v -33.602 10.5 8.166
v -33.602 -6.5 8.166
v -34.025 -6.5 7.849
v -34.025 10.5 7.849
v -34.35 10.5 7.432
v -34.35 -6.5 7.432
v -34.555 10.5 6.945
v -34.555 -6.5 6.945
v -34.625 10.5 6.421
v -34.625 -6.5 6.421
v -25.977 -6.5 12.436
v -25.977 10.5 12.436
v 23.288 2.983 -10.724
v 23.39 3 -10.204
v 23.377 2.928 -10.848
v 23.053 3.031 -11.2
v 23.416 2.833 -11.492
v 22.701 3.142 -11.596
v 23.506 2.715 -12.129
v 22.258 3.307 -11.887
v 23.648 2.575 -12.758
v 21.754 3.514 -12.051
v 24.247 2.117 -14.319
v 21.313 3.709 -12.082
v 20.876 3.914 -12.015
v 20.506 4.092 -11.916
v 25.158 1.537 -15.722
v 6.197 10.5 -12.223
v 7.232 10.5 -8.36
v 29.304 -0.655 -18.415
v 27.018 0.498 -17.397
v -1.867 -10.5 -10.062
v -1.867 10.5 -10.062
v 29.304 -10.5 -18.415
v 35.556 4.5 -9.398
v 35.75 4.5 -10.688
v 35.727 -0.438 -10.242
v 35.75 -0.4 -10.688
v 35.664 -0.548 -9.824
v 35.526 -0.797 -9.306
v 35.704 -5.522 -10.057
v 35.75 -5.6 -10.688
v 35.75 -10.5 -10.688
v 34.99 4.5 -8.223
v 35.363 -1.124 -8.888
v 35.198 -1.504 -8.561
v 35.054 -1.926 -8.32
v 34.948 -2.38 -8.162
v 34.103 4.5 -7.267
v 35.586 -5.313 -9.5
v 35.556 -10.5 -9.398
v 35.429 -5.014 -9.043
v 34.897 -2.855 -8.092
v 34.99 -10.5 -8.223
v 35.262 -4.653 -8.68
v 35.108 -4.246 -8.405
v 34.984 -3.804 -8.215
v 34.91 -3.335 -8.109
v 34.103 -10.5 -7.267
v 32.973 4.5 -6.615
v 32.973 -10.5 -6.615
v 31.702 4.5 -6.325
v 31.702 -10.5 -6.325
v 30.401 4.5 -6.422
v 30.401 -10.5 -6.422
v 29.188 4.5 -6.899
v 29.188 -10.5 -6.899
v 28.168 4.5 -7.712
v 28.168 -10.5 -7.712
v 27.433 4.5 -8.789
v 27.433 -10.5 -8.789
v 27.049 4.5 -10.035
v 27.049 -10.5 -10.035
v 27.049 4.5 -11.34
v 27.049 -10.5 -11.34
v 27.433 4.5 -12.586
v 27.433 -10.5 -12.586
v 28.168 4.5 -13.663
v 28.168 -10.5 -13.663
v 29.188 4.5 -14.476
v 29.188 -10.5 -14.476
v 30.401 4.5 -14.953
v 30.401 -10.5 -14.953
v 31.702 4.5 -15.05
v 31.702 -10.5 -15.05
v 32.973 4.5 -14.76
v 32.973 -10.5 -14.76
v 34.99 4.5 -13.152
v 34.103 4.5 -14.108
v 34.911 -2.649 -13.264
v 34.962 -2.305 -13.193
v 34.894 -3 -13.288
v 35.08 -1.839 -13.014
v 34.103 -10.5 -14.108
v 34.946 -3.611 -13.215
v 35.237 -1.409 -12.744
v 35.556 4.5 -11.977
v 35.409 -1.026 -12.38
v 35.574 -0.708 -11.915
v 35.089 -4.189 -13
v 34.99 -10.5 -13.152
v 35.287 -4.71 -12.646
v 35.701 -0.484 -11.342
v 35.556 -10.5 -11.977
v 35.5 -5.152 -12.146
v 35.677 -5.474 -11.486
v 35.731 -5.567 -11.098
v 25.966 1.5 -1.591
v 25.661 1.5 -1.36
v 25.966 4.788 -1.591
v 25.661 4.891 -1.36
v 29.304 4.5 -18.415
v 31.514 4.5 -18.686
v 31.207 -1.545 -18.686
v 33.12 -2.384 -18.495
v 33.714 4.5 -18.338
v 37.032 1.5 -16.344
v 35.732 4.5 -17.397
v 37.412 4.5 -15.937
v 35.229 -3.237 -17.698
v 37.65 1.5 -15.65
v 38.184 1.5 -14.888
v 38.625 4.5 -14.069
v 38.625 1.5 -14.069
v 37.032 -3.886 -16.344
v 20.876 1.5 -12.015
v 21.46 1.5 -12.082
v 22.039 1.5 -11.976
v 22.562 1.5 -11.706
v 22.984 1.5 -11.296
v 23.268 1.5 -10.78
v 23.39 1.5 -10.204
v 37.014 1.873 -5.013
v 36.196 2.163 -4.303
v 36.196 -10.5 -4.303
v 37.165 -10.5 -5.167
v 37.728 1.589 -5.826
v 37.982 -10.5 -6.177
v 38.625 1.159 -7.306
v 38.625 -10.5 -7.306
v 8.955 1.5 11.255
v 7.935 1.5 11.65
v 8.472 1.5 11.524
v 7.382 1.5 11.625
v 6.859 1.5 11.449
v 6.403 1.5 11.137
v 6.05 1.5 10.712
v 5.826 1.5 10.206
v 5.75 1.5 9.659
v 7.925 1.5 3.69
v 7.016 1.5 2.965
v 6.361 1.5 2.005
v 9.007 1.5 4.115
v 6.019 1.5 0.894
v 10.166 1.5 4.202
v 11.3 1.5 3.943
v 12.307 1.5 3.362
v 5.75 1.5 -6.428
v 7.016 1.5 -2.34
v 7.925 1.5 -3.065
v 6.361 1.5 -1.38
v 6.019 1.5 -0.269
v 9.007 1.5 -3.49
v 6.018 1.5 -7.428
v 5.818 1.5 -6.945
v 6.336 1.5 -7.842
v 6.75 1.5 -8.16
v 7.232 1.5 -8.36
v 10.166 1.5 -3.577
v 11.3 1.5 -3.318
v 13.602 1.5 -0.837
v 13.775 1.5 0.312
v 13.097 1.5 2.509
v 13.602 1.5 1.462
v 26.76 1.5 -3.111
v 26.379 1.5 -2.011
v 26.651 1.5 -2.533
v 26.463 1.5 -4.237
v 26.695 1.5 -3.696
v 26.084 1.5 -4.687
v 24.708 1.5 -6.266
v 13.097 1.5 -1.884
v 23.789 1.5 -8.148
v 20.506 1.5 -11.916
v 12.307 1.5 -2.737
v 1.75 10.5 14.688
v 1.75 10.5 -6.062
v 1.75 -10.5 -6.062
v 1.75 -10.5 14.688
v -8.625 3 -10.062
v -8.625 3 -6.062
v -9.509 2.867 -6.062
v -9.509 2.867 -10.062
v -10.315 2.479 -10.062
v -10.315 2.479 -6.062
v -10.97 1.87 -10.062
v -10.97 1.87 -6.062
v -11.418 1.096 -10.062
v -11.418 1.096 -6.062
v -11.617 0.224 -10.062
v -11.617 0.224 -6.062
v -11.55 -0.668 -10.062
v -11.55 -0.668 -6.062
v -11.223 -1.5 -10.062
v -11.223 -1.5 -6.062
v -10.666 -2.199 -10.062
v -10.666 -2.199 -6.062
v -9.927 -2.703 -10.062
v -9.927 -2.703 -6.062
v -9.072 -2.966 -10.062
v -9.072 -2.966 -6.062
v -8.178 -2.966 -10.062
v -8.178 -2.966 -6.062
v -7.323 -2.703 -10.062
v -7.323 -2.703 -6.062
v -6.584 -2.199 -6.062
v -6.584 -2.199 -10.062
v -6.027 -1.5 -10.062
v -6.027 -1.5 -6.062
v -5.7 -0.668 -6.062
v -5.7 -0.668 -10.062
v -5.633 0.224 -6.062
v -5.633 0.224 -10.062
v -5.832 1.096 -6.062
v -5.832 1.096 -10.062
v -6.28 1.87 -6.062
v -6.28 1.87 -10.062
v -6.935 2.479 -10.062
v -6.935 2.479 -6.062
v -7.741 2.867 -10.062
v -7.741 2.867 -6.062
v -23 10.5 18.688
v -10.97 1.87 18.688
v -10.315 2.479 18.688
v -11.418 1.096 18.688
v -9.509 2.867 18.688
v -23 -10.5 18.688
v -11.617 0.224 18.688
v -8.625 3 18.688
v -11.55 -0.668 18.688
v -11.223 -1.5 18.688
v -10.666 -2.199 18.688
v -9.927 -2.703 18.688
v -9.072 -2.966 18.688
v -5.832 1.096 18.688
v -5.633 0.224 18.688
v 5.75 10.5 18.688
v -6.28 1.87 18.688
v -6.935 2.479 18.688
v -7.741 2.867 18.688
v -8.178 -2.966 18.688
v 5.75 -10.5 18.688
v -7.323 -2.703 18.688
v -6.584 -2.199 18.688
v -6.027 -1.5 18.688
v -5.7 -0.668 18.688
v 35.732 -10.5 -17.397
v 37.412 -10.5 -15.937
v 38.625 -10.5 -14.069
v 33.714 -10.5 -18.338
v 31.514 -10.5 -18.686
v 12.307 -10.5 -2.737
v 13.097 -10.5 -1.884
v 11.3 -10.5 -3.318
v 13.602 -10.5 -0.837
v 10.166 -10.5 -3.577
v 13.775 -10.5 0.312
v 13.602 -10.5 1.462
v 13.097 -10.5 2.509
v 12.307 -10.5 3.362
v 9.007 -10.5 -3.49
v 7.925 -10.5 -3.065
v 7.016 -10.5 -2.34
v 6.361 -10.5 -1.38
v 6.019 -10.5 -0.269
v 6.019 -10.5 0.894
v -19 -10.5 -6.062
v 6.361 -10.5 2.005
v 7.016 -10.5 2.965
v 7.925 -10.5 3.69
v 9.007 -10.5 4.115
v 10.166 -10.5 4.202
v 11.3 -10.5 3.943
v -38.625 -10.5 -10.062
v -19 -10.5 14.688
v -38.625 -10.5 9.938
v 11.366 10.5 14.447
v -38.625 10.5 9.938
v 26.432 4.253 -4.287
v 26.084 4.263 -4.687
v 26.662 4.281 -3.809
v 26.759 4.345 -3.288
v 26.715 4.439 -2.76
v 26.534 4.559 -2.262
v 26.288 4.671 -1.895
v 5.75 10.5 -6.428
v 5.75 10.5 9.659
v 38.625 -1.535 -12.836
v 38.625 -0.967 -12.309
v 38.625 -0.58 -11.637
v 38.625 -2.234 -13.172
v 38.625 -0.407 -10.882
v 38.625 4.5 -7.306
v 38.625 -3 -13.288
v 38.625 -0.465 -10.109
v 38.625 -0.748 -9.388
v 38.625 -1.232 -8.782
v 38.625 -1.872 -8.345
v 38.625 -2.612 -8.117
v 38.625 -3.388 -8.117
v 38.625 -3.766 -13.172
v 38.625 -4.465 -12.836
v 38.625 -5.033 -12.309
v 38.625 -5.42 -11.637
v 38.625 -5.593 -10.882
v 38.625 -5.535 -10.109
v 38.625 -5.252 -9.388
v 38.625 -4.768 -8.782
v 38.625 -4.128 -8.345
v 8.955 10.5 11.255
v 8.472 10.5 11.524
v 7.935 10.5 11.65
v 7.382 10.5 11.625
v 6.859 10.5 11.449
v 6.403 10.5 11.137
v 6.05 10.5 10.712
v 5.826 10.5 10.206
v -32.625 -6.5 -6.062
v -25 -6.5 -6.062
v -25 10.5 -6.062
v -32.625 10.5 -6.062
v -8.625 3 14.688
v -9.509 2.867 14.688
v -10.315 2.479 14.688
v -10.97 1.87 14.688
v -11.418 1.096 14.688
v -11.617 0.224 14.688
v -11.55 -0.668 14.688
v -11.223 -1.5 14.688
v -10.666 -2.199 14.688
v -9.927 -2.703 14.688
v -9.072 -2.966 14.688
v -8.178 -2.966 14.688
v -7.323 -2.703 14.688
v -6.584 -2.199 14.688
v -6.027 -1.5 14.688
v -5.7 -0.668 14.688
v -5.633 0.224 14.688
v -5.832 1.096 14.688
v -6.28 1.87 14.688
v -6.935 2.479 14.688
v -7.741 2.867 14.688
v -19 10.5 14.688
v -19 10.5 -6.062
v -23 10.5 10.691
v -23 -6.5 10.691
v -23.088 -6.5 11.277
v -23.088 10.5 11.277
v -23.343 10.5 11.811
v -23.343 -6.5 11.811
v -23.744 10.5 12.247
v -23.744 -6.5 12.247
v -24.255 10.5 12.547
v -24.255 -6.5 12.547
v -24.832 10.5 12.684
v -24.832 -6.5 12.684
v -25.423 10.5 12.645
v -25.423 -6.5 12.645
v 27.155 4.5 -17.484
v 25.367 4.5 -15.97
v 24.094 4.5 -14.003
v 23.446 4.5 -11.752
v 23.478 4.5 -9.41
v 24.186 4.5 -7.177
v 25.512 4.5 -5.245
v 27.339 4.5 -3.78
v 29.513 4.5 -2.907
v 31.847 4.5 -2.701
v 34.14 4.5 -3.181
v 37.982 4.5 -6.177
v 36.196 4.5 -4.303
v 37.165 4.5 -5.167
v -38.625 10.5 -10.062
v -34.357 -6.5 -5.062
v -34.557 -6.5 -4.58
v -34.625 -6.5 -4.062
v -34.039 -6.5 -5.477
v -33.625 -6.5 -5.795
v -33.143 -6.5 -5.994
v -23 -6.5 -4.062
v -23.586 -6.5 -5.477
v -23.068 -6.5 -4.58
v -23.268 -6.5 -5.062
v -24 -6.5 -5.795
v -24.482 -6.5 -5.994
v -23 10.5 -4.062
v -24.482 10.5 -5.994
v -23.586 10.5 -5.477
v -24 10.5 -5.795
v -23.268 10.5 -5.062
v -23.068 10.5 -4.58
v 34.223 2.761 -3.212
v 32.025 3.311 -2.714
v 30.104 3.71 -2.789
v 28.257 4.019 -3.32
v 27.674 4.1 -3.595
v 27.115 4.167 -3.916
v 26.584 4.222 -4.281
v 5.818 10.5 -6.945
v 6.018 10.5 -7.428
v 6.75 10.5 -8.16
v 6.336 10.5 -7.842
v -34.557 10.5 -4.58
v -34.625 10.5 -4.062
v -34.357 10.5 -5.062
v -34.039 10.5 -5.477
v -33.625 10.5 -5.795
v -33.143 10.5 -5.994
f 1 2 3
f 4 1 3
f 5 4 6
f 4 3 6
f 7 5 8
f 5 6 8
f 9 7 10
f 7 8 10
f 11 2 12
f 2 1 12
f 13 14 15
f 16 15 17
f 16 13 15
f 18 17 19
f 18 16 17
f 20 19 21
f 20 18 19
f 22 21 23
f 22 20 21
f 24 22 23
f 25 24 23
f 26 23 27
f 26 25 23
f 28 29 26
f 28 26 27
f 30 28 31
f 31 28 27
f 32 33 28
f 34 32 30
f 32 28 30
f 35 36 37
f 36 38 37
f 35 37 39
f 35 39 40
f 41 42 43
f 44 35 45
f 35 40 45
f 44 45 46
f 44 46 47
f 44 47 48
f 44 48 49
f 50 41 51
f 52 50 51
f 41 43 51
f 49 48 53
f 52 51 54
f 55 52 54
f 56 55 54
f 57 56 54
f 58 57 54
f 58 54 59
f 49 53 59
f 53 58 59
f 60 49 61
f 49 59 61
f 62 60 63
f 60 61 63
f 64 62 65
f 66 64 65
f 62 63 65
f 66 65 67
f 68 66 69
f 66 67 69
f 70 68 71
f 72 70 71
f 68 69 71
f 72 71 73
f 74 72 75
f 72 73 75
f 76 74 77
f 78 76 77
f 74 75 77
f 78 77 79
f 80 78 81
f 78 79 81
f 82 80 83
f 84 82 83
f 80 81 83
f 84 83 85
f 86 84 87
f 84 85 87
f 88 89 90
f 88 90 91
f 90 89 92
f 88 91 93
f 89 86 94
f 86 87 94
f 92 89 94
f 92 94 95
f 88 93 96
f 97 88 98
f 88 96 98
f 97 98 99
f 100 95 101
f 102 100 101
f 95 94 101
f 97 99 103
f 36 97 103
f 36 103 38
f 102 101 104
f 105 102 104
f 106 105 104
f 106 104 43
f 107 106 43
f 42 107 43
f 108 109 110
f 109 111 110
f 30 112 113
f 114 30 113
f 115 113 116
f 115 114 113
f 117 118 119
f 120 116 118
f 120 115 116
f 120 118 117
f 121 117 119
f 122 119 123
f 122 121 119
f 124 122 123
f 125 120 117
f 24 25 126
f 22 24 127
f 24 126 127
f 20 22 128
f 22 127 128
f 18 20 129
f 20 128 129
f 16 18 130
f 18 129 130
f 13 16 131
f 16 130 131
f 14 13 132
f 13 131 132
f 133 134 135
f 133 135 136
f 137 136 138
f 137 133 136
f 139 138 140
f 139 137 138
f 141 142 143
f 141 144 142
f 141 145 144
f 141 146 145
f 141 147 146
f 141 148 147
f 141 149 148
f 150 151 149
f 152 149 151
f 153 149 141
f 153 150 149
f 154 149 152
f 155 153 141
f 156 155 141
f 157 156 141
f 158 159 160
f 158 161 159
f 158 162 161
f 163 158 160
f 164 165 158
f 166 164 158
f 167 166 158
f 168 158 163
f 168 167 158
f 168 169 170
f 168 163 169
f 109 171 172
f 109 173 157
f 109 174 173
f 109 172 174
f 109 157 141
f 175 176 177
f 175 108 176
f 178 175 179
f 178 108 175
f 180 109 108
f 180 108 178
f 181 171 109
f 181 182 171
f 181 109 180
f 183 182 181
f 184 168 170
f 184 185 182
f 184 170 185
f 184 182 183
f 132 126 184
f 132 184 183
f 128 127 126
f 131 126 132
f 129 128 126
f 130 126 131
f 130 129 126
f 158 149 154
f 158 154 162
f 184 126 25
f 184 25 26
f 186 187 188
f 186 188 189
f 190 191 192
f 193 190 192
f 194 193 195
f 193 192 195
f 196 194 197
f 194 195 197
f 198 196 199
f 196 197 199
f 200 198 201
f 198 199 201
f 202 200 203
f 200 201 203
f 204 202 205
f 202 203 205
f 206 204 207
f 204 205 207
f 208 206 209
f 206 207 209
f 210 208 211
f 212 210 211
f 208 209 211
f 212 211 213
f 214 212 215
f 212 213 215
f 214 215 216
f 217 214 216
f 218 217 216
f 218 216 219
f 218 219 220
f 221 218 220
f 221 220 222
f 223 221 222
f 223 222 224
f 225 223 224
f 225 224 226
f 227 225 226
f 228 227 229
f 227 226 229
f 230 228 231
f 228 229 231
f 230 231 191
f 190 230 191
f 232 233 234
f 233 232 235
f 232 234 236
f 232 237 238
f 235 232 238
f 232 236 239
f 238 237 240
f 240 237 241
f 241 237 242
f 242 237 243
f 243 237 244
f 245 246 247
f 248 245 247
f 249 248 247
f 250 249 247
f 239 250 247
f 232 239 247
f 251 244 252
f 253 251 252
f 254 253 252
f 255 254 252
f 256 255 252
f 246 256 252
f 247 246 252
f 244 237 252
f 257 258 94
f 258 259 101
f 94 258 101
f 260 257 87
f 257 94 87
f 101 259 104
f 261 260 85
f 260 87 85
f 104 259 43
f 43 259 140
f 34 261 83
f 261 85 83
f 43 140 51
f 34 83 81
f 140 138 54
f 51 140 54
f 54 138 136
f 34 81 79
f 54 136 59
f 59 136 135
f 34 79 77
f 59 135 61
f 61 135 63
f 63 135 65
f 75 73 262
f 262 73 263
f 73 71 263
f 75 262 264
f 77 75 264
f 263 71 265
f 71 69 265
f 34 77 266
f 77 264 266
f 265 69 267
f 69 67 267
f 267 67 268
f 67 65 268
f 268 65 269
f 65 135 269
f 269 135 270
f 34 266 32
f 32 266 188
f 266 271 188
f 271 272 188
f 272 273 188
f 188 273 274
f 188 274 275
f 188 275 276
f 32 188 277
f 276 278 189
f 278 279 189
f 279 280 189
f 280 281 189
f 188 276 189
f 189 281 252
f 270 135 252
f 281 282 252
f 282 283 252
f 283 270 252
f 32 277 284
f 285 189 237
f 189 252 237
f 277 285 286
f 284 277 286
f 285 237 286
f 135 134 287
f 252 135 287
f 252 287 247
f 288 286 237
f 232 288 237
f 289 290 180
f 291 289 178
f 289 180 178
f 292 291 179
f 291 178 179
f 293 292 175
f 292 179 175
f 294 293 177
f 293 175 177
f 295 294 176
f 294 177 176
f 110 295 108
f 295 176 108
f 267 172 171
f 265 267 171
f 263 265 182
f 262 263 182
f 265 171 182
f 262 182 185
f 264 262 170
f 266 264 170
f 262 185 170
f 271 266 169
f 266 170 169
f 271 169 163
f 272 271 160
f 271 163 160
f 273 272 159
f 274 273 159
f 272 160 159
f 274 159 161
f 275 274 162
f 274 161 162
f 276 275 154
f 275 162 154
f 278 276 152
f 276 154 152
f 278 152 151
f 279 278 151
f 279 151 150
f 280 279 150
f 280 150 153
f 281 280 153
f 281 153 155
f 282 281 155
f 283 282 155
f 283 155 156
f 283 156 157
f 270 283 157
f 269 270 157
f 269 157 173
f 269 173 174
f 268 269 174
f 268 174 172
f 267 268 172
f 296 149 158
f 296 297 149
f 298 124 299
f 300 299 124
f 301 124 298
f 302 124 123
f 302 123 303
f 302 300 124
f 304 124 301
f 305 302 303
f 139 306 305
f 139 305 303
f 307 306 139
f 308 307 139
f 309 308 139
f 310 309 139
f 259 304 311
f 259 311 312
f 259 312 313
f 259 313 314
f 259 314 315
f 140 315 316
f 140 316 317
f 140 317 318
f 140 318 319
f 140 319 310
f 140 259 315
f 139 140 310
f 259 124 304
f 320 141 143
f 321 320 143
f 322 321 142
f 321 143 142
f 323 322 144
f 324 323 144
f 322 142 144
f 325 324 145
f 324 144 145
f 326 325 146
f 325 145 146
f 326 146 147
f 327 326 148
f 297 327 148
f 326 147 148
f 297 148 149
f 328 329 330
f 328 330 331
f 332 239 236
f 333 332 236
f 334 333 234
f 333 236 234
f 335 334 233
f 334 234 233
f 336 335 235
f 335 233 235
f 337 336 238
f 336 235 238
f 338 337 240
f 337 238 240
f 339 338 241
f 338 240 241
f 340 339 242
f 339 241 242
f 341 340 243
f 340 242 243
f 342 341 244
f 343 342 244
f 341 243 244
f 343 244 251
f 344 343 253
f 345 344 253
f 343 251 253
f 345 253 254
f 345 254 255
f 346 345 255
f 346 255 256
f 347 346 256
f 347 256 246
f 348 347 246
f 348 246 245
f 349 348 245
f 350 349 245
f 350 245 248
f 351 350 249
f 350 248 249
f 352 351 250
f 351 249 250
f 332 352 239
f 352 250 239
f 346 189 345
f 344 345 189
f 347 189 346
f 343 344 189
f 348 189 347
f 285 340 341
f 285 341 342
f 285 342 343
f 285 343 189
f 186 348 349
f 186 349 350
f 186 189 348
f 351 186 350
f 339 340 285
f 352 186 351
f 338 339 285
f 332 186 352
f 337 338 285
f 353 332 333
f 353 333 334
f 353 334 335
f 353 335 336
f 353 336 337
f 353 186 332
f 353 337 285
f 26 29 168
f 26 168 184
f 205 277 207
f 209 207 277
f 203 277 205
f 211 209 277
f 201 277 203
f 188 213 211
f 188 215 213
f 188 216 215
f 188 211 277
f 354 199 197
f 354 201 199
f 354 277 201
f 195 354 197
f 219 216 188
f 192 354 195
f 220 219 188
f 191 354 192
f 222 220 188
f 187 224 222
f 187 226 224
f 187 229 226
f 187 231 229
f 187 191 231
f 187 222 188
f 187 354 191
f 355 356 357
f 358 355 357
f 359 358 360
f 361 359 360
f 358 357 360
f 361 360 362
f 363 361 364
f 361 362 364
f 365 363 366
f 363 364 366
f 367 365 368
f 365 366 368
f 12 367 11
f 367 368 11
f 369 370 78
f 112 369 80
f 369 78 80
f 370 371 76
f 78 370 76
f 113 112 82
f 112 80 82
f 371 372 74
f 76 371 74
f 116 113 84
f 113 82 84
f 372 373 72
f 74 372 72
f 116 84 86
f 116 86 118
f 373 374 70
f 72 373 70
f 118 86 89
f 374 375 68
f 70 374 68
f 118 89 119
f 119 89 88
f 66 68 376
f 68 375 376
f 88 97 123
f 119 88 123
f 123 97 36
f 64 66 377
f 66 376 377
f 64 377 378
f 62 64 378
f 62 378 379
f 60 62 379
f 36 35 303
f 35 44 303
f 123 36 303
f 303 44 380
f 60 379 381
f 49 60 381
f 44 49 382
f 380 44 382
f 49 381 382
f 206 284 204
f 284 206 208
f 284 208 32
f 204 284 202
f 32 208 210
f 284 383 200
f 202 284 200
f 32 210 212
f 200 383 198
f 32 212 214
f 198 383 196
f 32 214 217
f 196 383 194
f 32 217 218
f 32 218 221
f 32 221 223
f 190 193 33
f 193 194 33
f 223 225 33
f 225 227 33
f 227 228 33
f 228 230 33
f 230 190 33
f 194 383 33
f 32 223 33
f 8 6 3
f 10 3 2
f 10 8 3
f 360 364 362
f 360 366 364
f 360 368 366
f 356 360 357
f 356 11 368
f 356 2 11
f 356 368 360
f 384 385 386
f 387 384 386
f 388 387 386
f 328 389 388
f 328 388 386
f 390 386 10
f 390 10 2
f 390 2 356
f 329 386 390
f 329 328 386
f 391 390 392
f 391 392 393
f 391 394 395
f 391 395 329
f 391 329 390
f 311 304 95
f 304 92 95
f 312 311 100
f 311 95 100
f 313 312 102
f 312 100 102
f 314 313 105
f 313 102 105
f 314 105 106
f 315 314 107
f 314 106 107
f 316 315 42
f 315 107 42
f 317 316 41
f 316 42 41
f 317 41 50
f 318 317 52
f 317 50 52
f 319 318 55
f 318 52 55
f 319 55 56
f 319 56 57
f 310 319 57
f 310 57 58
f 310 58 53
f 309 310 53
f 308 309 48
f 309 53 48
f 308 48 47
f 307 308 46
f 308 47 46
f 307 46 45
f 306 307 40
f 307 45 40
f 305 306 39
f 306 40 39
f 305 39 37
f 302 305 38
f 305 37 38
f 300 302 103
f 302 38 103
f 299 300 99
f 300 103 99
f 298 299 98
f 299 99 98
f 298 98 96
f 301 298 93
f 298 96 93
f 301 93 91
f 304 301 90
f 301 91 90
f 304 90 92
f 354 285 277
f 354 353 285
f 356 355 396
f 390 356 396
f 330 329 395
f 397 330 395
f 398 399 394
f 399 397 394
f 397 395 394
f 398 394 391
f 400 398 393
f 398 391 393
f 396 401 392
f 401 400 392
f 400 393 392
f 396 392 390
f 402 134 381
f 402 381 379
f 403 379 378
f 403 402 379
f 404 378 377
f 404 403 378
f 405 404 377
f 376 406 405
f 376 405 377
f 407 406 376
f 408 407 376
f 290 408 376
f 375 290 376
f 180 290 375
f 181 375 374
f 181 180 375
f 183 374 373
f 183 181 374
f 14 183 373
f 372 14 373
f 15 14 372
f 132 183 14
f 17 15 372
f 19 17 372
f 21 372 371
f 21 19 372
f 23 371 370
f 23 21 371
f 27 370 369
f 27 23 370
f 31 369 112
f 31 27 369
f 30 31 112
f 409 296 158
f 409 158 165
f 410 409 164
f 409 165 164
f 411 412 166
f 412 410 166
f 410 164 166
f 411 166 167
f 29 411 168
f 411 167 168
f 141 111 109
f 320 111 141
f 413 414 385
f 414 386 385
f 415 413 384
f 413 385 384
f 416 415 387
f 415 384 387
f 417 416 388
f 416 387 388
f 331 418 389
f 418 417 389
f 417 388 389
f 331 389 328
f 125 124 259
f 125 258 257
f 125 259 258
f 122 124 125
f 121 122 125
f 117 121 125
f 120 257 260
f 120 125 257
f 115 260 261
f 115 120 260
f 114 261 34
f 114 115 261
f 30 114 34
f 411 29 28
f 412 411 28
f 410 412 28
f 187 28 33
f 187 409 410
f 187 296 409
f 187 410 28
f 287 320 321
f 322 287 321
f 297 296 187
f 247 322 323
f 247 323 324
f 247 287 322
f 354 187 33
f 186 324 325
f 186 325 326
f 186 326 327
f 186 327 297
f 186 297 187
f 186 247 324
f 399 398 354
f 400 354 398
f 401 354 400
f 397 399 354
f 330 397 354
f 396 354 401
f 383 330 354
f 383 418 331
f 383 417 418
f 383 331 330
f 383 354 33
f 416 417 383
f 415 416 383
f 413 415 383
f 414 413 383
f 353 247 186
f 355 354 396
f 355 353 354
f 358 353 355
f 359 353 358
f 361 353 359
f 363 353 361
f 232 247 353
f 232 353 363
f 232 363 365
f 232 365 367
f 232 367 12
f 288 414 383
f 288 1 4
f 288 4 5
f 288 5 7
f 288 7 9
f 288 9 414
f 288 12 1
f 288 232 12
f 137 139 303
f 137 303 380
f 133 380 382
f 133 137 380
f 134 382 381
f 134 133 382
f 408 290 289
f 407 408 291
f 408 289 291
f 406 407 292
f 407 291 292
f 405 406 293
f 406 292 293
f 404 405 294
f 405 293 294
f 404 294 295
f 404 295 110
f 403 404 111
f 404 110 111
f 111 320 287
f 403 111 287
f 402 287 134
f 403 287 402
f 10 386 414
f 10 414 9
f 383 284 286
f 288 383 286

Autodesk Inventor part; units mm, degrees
ref_plane "YZ Plane" through (0, 0, 0) normal (1, 0, 0) x (0, 1, 0)
sketch "Sketch1" plane through (0, 0, 0) normal (0, 1, 0) x (-1, 0, 0)
  line L0 (38.625, 18.6875) -> (-38.625, 18.6875)
  line L1 (-38.625, 18.6875) -> (-38.625, -18.6875)
  line L2 (-38.625, -18.6875) -> (38.625, -18.6875)
  line L3 (38.625, -18.6875) -> (38.625, 18.6875)
  line L4 (38.625, 18.6875) -> (-38.625, -18.6875) construction
  line L5 (-38.625, 18.6875) -> (38.625, -18.6875) construction
  point P0 (0, 0)
  dimension "d0" = 77.25
  dimension "d2" = 37.375
extrude "Extrusion1" add sketch "Sketch1" along normal mid plane 21
sketch "Sketch2" plane through (0, 10.5, 0) normal (0, 1, 0) x (1, 0, 0)
  line L0 (-19, 6.0625) -> (1.75, 6.0625)
  line L1 (1.75, 6.0625) -> (1.75, -14.6875)
  line L2 (1.75, -14.6875) -> (-19, -14.6875)
  line L3 (-19, -14.6875) -> (-19, 6.0625)
  line L4 (-19, 6.0625) -> (1.75, -14.6875) construction
  line L5 (1.75, 6.0625) -> (-19, -14.6875) construction
  line L6 (-38.625, -18.6875) -> (38.625, -18.6875) projected
  line L7 (-38.625, 18.6875) -> (-38.625, -18.6875) projected
  line L8 (-38.625, 10.0625) -> (-1.8672, 10.0625)
  line L9 (-1.8672, 10.0625) -> (29.3044, 18.4149)
  arc A0 (36.196, 4.3033) -> (29.3044, 18.4149) centre (31.375, 10.6875) ccw
  line L10 (38.625, 18.6875) -> (-38.625, 18.6875) projected
  line L11 (36.196, 4.3033) -> (5.75, -18.6875)
  line L12 (-38.625, -9.9375) -> (-23, -18.6875)
  arc A1 (29.3044, 18.4149) -> (36.196, 4.3033) centre (31.375, 10.6875) ccw construction
  circle A2 centre (9.875, -0.3125) radius 3.9
  circle A3 centre (31.375, 10.6875) radius 4.375
  point P0 (0, 0)
  point P1 (-8.625, -4.3125)
  dimension "d5" = 20.75
  dimension "d6" = 20.75
  dimension "d7" = 4
  dimension "d8" = 19.625
  dimension "d9" = 28.75
  dimension "d10" = 16
  dimension "d11" = 70
  dimension "d12" = 44.375
  dimension "d13" = 165
  dimension "d14" = 15.625
  dimension "d15" = 8.75
  dimension "d18" = 7.8
  dimension "d19" = 18.375
  dimension "d20" = 48.5
  dimension "d21" = 8.75
extrude "Extrusion2" cut sketch "Sketch2" against normal blind 23.75 contours L12 L7 L8 L9 A0 L11 L6 keep common part
sketch "Sketch3" plane through (0, 10.5, 0) normal (0, 1, 0) x (1, 0, 0)
  line L0 (-23, 6.0625) -> (-34.625, 6.0625)
  line L1 (-34.625, 6.0625) -> (-34.625, -7.593)
  line L2 (-34.625, -7.593) -> (-23, -14.103)
  line L3 (-23, -14.103) -> (-23, 6.0625)
  line L4 (-19, 6.0625) -> (-19, -14.6875) projected
  line L5 (-38.625, 10.0625) -> (-1.8672, 10.0625) projected
  line L6 (-38.625, 10.0625) -> (-38.625, -9.9375) projected
  line L7 (-23, -18.6875) -> (-38.625, -9.9375) projected
  point P0 (0, 0)
  dimension "d22" = 4
  dimension "d23" = 4
  dimension "d24" = 4
  dimension "d25" = 4
extrude "Extrusion3" cut sketch "Sketch3" against normal blind 17
sketch "Sketch4" plane through (0, 10.5, 0) normal (0, 1, 0) x (1, 0, 0)
  line L0 (5.75, -13.6752) -> (5.75, 7.9624)
  line L1 (5.75, 7.9624) -> (23.2324, 12.6468)
  arc A0 (23.2324, 12.6468) -> (27.9136, 3.0613) centre (31.375, 10.6875) ccw
  line L2 (27.9136, 3.0613) -> (5.75, -13.6752)
  circle A1 centre (31.375, 10.6875) radius 4.375 projected
  line L3 (-1.8672, 10.0625) -> (29.3044, 18.4149) projected
  line L4 (36.196, 4.3033) -> (5.75, -18.6875) projected
  line L5 (1.75, -14.6875) -> (1.75, 6.0625) projected
  point P0 (0, 0)
  dimension "d28" = 4
  dimension "d29" = 4
  dimension "d30" = 4
  dimension "d31" = 4
extrude "Extrusion4" cut sketch "Sketch4" against normal blind 9 contours L0 L1 A0 L2
fillet "Fillet1" radius 2 8 edges at (-34.625, 2, -6.0625) (-23, 2, -6.0625) (-34.625, 2, 7.593) (-23, 2, 14.103) (5.75, 6, 13.6752) (27.9136, 6, -3.0613) (5.75, 6, -7.9624) (23.2324, 6, -12.6468)
ref_plane "Work Plane1" through (7.2324, 10.5, -8.3596) normal (-0.8754261, 0.4226183, 0.2345697) x (0.258819, 0, 0.9659258)
sketch "Sketch5" plane through (7.2324, 10.5, -8.3596) normal (-0.8754261, 0.4226183, 0.2345697) x (0.258819, 0, 0.9659258)
  line L0 (-4, -3.5283) -> (-4, 10.1101) projected
  line L1 (0, 0) -> (0, 5.8077) projected
  line L2 (0, 0) -> (-4, 0)
  line L3 (-4, 0) -> (-4, 17.443)
  line L4 (-4, 17.443) -> (0, 17.443)
  line L5 (0, 17.443) -> (0, 0)
  point P0 (6.2029, -13.383)
extrude "Extrusion5" cut sketch "Sketch5" against normal blind 98.5
ref_plane "Work Plane2" through (8.9552, 10.5, 11.2548) normal (-0.770837, 0.258819, 0.5820851) x (-0.6026188, 0, -0.7980292)
sketch "Sketch6" plane through (8.9552, 10.5, 11.2548) normal (-0.770837, 0.258819, 0.5820851) x (-0.6026188, 0, -0.7980292)
  line L0 (-4, -8.053) -> (-4, 1.8213) projected
  line L1 (0, -5.4181) -> (0, 0) projected
  line L2 (0, 0) -> (-4, 0)
  line L3 (-4, 0) -> (-4, -11.4491)
  line L4 (-4, -11.4491) -> (0, -11.4491)
  line L5 (0, -11.4491) -> (0, 0)
  point P0 (14.3782, 10.2365)
extrude "Extrusion6" cut sketch "Sketch6" against normal blind 98.5
sketch "Sketch7" plane through (0, 10.5, 0) normal (0, 1, 0) x (1, 0, 0)
  line L0 (25.6612, 1.3605) -> (32.3712, 6.4274) projected
  arc A0 (28.6279, 14.0925) -> (32.3712, 6.4274) centre (31.375, 10.6875) ccw projected
  line L1 (28.6279, 14.0925) -> (20.5062, 11.9163) projected
  arc A1 (23.0192, 10.12) -> (20.5062, 11.9163) centre (21.0238, 9.9845) ccw projected
  arc A2 (23.0192, 10.12) -> (25.7898, 4.4468) centre (31.375, 10.6875) ccw projected
  arc A3 (25.6612, 1.3605) -> (25.7898, 4.4468) centre (24.456, 2.9565) ccw projected
  line L2 (35.1997, 8.5633) -> (38.625, 11.1499) projected
  line L3 (38.625, 11.1499) -> (38.625, 14.0694) projected
  arc A4 (38.625, 14.0694) -> (37.0319, 16.3444) centre (31.375, 10.6875) ccw projected
  line L4 (37.0319, 16.3444) -> (32.0515, 15.0099) projected
  arc A5 (35.1997, 8.5633) -> (32.0515, 15.0099) centre (31.375, 10.6875) ccw projected
  point P0 (0, 0)
extrude "Extrusion7" cut sketch "Sketch7" against normal up to surface (9 mm away)
sketch "Sketch8" plane through (0, -10.5, 0) normal (0, -1, 0) x (1, 0, 0)
  arc A0 (29.3044, -18.4149) -> (38.625, -14.0694) centre (31.375, -10.6875) ccw projected
  circle A1 centre (31.375, -10.6875) radius 4.375 projected
  arc A2 (38.625, -7.3056) -> (36.196, -4.3033) centre (31.375, -10.6875) ccw projected
  line L0 (38.625, -14.0694) -> (38.625, -7.3056) projected
  line L1 (36.196, -4.3033) -> (11.3657, 14.4469) projected
  arc A3 (36.196, -4.3033) -> (29.3044, -18.4149) centre (31.375, -10.6875) ccw
  point P0 (0, 0)
extrude "Extrusion8" add sketch "Sketch8" against normal blind 15
fillet "Fillet2" radius 2 2 edges at (28.2566, 2.7597, -3.3203) (23.6476, 2.0377, -12.7581)
sketch "Sketch9" plane through (38.625, -10.5, -7.3056) normal (1, 0, 0) x (0, 0, -1)
  line L0 (0, 0) -> (0, 15) projected
  line L1 (6.7639, 0) -> (0, 0) projected
  line L2 (6.7639, 15) -> (6.7639, 0) projected
  line L3 (0, 15) -> (6.7639, 15) projected
  point P0 (-7.3056, 10.5)
  point P1 (3.3819, 7.5)
  point P2 (3.3819, 15)
  point P3 (6.7639, 7.5)
hole "Hole1" at (38.625, -3, -10.6875) direction (-1, 0, 0) diameter 5.2 end up to surface
sketch "Sketch10" plane through (-1.8672, 10.5, -10.0625) normal (0, 0, -1) x (-1, 0, 0)
  line L0 (-3.6172, -21) -> (17.1328, -21) projected
  line L1 (17.1328, 0) -> (17.1328, -21) projected
  line L2 (17.1328, 0) -> (-3.6172, 0) projected
  line L3 (-3.6172, 0) -> (-3.6172, -21) projected
  point P0 (-1.8672, -10.5)
  point P1 (6.7578, -10.5)
  point P2 (6.7578, 0)
  point P3 (17.1328, -10.5)
hole "Hole2" at (-8.625, 0, -10.0625) direction (0, 0, 1) diameter 6 end through all
equation "\"d6\" = d5"
equation "\"d23\" = d22"
equation "\"d24\" = d23"
equation "\"d25\" = d24"
properties part number "Y Foot Left" material "ABS Plastic"
